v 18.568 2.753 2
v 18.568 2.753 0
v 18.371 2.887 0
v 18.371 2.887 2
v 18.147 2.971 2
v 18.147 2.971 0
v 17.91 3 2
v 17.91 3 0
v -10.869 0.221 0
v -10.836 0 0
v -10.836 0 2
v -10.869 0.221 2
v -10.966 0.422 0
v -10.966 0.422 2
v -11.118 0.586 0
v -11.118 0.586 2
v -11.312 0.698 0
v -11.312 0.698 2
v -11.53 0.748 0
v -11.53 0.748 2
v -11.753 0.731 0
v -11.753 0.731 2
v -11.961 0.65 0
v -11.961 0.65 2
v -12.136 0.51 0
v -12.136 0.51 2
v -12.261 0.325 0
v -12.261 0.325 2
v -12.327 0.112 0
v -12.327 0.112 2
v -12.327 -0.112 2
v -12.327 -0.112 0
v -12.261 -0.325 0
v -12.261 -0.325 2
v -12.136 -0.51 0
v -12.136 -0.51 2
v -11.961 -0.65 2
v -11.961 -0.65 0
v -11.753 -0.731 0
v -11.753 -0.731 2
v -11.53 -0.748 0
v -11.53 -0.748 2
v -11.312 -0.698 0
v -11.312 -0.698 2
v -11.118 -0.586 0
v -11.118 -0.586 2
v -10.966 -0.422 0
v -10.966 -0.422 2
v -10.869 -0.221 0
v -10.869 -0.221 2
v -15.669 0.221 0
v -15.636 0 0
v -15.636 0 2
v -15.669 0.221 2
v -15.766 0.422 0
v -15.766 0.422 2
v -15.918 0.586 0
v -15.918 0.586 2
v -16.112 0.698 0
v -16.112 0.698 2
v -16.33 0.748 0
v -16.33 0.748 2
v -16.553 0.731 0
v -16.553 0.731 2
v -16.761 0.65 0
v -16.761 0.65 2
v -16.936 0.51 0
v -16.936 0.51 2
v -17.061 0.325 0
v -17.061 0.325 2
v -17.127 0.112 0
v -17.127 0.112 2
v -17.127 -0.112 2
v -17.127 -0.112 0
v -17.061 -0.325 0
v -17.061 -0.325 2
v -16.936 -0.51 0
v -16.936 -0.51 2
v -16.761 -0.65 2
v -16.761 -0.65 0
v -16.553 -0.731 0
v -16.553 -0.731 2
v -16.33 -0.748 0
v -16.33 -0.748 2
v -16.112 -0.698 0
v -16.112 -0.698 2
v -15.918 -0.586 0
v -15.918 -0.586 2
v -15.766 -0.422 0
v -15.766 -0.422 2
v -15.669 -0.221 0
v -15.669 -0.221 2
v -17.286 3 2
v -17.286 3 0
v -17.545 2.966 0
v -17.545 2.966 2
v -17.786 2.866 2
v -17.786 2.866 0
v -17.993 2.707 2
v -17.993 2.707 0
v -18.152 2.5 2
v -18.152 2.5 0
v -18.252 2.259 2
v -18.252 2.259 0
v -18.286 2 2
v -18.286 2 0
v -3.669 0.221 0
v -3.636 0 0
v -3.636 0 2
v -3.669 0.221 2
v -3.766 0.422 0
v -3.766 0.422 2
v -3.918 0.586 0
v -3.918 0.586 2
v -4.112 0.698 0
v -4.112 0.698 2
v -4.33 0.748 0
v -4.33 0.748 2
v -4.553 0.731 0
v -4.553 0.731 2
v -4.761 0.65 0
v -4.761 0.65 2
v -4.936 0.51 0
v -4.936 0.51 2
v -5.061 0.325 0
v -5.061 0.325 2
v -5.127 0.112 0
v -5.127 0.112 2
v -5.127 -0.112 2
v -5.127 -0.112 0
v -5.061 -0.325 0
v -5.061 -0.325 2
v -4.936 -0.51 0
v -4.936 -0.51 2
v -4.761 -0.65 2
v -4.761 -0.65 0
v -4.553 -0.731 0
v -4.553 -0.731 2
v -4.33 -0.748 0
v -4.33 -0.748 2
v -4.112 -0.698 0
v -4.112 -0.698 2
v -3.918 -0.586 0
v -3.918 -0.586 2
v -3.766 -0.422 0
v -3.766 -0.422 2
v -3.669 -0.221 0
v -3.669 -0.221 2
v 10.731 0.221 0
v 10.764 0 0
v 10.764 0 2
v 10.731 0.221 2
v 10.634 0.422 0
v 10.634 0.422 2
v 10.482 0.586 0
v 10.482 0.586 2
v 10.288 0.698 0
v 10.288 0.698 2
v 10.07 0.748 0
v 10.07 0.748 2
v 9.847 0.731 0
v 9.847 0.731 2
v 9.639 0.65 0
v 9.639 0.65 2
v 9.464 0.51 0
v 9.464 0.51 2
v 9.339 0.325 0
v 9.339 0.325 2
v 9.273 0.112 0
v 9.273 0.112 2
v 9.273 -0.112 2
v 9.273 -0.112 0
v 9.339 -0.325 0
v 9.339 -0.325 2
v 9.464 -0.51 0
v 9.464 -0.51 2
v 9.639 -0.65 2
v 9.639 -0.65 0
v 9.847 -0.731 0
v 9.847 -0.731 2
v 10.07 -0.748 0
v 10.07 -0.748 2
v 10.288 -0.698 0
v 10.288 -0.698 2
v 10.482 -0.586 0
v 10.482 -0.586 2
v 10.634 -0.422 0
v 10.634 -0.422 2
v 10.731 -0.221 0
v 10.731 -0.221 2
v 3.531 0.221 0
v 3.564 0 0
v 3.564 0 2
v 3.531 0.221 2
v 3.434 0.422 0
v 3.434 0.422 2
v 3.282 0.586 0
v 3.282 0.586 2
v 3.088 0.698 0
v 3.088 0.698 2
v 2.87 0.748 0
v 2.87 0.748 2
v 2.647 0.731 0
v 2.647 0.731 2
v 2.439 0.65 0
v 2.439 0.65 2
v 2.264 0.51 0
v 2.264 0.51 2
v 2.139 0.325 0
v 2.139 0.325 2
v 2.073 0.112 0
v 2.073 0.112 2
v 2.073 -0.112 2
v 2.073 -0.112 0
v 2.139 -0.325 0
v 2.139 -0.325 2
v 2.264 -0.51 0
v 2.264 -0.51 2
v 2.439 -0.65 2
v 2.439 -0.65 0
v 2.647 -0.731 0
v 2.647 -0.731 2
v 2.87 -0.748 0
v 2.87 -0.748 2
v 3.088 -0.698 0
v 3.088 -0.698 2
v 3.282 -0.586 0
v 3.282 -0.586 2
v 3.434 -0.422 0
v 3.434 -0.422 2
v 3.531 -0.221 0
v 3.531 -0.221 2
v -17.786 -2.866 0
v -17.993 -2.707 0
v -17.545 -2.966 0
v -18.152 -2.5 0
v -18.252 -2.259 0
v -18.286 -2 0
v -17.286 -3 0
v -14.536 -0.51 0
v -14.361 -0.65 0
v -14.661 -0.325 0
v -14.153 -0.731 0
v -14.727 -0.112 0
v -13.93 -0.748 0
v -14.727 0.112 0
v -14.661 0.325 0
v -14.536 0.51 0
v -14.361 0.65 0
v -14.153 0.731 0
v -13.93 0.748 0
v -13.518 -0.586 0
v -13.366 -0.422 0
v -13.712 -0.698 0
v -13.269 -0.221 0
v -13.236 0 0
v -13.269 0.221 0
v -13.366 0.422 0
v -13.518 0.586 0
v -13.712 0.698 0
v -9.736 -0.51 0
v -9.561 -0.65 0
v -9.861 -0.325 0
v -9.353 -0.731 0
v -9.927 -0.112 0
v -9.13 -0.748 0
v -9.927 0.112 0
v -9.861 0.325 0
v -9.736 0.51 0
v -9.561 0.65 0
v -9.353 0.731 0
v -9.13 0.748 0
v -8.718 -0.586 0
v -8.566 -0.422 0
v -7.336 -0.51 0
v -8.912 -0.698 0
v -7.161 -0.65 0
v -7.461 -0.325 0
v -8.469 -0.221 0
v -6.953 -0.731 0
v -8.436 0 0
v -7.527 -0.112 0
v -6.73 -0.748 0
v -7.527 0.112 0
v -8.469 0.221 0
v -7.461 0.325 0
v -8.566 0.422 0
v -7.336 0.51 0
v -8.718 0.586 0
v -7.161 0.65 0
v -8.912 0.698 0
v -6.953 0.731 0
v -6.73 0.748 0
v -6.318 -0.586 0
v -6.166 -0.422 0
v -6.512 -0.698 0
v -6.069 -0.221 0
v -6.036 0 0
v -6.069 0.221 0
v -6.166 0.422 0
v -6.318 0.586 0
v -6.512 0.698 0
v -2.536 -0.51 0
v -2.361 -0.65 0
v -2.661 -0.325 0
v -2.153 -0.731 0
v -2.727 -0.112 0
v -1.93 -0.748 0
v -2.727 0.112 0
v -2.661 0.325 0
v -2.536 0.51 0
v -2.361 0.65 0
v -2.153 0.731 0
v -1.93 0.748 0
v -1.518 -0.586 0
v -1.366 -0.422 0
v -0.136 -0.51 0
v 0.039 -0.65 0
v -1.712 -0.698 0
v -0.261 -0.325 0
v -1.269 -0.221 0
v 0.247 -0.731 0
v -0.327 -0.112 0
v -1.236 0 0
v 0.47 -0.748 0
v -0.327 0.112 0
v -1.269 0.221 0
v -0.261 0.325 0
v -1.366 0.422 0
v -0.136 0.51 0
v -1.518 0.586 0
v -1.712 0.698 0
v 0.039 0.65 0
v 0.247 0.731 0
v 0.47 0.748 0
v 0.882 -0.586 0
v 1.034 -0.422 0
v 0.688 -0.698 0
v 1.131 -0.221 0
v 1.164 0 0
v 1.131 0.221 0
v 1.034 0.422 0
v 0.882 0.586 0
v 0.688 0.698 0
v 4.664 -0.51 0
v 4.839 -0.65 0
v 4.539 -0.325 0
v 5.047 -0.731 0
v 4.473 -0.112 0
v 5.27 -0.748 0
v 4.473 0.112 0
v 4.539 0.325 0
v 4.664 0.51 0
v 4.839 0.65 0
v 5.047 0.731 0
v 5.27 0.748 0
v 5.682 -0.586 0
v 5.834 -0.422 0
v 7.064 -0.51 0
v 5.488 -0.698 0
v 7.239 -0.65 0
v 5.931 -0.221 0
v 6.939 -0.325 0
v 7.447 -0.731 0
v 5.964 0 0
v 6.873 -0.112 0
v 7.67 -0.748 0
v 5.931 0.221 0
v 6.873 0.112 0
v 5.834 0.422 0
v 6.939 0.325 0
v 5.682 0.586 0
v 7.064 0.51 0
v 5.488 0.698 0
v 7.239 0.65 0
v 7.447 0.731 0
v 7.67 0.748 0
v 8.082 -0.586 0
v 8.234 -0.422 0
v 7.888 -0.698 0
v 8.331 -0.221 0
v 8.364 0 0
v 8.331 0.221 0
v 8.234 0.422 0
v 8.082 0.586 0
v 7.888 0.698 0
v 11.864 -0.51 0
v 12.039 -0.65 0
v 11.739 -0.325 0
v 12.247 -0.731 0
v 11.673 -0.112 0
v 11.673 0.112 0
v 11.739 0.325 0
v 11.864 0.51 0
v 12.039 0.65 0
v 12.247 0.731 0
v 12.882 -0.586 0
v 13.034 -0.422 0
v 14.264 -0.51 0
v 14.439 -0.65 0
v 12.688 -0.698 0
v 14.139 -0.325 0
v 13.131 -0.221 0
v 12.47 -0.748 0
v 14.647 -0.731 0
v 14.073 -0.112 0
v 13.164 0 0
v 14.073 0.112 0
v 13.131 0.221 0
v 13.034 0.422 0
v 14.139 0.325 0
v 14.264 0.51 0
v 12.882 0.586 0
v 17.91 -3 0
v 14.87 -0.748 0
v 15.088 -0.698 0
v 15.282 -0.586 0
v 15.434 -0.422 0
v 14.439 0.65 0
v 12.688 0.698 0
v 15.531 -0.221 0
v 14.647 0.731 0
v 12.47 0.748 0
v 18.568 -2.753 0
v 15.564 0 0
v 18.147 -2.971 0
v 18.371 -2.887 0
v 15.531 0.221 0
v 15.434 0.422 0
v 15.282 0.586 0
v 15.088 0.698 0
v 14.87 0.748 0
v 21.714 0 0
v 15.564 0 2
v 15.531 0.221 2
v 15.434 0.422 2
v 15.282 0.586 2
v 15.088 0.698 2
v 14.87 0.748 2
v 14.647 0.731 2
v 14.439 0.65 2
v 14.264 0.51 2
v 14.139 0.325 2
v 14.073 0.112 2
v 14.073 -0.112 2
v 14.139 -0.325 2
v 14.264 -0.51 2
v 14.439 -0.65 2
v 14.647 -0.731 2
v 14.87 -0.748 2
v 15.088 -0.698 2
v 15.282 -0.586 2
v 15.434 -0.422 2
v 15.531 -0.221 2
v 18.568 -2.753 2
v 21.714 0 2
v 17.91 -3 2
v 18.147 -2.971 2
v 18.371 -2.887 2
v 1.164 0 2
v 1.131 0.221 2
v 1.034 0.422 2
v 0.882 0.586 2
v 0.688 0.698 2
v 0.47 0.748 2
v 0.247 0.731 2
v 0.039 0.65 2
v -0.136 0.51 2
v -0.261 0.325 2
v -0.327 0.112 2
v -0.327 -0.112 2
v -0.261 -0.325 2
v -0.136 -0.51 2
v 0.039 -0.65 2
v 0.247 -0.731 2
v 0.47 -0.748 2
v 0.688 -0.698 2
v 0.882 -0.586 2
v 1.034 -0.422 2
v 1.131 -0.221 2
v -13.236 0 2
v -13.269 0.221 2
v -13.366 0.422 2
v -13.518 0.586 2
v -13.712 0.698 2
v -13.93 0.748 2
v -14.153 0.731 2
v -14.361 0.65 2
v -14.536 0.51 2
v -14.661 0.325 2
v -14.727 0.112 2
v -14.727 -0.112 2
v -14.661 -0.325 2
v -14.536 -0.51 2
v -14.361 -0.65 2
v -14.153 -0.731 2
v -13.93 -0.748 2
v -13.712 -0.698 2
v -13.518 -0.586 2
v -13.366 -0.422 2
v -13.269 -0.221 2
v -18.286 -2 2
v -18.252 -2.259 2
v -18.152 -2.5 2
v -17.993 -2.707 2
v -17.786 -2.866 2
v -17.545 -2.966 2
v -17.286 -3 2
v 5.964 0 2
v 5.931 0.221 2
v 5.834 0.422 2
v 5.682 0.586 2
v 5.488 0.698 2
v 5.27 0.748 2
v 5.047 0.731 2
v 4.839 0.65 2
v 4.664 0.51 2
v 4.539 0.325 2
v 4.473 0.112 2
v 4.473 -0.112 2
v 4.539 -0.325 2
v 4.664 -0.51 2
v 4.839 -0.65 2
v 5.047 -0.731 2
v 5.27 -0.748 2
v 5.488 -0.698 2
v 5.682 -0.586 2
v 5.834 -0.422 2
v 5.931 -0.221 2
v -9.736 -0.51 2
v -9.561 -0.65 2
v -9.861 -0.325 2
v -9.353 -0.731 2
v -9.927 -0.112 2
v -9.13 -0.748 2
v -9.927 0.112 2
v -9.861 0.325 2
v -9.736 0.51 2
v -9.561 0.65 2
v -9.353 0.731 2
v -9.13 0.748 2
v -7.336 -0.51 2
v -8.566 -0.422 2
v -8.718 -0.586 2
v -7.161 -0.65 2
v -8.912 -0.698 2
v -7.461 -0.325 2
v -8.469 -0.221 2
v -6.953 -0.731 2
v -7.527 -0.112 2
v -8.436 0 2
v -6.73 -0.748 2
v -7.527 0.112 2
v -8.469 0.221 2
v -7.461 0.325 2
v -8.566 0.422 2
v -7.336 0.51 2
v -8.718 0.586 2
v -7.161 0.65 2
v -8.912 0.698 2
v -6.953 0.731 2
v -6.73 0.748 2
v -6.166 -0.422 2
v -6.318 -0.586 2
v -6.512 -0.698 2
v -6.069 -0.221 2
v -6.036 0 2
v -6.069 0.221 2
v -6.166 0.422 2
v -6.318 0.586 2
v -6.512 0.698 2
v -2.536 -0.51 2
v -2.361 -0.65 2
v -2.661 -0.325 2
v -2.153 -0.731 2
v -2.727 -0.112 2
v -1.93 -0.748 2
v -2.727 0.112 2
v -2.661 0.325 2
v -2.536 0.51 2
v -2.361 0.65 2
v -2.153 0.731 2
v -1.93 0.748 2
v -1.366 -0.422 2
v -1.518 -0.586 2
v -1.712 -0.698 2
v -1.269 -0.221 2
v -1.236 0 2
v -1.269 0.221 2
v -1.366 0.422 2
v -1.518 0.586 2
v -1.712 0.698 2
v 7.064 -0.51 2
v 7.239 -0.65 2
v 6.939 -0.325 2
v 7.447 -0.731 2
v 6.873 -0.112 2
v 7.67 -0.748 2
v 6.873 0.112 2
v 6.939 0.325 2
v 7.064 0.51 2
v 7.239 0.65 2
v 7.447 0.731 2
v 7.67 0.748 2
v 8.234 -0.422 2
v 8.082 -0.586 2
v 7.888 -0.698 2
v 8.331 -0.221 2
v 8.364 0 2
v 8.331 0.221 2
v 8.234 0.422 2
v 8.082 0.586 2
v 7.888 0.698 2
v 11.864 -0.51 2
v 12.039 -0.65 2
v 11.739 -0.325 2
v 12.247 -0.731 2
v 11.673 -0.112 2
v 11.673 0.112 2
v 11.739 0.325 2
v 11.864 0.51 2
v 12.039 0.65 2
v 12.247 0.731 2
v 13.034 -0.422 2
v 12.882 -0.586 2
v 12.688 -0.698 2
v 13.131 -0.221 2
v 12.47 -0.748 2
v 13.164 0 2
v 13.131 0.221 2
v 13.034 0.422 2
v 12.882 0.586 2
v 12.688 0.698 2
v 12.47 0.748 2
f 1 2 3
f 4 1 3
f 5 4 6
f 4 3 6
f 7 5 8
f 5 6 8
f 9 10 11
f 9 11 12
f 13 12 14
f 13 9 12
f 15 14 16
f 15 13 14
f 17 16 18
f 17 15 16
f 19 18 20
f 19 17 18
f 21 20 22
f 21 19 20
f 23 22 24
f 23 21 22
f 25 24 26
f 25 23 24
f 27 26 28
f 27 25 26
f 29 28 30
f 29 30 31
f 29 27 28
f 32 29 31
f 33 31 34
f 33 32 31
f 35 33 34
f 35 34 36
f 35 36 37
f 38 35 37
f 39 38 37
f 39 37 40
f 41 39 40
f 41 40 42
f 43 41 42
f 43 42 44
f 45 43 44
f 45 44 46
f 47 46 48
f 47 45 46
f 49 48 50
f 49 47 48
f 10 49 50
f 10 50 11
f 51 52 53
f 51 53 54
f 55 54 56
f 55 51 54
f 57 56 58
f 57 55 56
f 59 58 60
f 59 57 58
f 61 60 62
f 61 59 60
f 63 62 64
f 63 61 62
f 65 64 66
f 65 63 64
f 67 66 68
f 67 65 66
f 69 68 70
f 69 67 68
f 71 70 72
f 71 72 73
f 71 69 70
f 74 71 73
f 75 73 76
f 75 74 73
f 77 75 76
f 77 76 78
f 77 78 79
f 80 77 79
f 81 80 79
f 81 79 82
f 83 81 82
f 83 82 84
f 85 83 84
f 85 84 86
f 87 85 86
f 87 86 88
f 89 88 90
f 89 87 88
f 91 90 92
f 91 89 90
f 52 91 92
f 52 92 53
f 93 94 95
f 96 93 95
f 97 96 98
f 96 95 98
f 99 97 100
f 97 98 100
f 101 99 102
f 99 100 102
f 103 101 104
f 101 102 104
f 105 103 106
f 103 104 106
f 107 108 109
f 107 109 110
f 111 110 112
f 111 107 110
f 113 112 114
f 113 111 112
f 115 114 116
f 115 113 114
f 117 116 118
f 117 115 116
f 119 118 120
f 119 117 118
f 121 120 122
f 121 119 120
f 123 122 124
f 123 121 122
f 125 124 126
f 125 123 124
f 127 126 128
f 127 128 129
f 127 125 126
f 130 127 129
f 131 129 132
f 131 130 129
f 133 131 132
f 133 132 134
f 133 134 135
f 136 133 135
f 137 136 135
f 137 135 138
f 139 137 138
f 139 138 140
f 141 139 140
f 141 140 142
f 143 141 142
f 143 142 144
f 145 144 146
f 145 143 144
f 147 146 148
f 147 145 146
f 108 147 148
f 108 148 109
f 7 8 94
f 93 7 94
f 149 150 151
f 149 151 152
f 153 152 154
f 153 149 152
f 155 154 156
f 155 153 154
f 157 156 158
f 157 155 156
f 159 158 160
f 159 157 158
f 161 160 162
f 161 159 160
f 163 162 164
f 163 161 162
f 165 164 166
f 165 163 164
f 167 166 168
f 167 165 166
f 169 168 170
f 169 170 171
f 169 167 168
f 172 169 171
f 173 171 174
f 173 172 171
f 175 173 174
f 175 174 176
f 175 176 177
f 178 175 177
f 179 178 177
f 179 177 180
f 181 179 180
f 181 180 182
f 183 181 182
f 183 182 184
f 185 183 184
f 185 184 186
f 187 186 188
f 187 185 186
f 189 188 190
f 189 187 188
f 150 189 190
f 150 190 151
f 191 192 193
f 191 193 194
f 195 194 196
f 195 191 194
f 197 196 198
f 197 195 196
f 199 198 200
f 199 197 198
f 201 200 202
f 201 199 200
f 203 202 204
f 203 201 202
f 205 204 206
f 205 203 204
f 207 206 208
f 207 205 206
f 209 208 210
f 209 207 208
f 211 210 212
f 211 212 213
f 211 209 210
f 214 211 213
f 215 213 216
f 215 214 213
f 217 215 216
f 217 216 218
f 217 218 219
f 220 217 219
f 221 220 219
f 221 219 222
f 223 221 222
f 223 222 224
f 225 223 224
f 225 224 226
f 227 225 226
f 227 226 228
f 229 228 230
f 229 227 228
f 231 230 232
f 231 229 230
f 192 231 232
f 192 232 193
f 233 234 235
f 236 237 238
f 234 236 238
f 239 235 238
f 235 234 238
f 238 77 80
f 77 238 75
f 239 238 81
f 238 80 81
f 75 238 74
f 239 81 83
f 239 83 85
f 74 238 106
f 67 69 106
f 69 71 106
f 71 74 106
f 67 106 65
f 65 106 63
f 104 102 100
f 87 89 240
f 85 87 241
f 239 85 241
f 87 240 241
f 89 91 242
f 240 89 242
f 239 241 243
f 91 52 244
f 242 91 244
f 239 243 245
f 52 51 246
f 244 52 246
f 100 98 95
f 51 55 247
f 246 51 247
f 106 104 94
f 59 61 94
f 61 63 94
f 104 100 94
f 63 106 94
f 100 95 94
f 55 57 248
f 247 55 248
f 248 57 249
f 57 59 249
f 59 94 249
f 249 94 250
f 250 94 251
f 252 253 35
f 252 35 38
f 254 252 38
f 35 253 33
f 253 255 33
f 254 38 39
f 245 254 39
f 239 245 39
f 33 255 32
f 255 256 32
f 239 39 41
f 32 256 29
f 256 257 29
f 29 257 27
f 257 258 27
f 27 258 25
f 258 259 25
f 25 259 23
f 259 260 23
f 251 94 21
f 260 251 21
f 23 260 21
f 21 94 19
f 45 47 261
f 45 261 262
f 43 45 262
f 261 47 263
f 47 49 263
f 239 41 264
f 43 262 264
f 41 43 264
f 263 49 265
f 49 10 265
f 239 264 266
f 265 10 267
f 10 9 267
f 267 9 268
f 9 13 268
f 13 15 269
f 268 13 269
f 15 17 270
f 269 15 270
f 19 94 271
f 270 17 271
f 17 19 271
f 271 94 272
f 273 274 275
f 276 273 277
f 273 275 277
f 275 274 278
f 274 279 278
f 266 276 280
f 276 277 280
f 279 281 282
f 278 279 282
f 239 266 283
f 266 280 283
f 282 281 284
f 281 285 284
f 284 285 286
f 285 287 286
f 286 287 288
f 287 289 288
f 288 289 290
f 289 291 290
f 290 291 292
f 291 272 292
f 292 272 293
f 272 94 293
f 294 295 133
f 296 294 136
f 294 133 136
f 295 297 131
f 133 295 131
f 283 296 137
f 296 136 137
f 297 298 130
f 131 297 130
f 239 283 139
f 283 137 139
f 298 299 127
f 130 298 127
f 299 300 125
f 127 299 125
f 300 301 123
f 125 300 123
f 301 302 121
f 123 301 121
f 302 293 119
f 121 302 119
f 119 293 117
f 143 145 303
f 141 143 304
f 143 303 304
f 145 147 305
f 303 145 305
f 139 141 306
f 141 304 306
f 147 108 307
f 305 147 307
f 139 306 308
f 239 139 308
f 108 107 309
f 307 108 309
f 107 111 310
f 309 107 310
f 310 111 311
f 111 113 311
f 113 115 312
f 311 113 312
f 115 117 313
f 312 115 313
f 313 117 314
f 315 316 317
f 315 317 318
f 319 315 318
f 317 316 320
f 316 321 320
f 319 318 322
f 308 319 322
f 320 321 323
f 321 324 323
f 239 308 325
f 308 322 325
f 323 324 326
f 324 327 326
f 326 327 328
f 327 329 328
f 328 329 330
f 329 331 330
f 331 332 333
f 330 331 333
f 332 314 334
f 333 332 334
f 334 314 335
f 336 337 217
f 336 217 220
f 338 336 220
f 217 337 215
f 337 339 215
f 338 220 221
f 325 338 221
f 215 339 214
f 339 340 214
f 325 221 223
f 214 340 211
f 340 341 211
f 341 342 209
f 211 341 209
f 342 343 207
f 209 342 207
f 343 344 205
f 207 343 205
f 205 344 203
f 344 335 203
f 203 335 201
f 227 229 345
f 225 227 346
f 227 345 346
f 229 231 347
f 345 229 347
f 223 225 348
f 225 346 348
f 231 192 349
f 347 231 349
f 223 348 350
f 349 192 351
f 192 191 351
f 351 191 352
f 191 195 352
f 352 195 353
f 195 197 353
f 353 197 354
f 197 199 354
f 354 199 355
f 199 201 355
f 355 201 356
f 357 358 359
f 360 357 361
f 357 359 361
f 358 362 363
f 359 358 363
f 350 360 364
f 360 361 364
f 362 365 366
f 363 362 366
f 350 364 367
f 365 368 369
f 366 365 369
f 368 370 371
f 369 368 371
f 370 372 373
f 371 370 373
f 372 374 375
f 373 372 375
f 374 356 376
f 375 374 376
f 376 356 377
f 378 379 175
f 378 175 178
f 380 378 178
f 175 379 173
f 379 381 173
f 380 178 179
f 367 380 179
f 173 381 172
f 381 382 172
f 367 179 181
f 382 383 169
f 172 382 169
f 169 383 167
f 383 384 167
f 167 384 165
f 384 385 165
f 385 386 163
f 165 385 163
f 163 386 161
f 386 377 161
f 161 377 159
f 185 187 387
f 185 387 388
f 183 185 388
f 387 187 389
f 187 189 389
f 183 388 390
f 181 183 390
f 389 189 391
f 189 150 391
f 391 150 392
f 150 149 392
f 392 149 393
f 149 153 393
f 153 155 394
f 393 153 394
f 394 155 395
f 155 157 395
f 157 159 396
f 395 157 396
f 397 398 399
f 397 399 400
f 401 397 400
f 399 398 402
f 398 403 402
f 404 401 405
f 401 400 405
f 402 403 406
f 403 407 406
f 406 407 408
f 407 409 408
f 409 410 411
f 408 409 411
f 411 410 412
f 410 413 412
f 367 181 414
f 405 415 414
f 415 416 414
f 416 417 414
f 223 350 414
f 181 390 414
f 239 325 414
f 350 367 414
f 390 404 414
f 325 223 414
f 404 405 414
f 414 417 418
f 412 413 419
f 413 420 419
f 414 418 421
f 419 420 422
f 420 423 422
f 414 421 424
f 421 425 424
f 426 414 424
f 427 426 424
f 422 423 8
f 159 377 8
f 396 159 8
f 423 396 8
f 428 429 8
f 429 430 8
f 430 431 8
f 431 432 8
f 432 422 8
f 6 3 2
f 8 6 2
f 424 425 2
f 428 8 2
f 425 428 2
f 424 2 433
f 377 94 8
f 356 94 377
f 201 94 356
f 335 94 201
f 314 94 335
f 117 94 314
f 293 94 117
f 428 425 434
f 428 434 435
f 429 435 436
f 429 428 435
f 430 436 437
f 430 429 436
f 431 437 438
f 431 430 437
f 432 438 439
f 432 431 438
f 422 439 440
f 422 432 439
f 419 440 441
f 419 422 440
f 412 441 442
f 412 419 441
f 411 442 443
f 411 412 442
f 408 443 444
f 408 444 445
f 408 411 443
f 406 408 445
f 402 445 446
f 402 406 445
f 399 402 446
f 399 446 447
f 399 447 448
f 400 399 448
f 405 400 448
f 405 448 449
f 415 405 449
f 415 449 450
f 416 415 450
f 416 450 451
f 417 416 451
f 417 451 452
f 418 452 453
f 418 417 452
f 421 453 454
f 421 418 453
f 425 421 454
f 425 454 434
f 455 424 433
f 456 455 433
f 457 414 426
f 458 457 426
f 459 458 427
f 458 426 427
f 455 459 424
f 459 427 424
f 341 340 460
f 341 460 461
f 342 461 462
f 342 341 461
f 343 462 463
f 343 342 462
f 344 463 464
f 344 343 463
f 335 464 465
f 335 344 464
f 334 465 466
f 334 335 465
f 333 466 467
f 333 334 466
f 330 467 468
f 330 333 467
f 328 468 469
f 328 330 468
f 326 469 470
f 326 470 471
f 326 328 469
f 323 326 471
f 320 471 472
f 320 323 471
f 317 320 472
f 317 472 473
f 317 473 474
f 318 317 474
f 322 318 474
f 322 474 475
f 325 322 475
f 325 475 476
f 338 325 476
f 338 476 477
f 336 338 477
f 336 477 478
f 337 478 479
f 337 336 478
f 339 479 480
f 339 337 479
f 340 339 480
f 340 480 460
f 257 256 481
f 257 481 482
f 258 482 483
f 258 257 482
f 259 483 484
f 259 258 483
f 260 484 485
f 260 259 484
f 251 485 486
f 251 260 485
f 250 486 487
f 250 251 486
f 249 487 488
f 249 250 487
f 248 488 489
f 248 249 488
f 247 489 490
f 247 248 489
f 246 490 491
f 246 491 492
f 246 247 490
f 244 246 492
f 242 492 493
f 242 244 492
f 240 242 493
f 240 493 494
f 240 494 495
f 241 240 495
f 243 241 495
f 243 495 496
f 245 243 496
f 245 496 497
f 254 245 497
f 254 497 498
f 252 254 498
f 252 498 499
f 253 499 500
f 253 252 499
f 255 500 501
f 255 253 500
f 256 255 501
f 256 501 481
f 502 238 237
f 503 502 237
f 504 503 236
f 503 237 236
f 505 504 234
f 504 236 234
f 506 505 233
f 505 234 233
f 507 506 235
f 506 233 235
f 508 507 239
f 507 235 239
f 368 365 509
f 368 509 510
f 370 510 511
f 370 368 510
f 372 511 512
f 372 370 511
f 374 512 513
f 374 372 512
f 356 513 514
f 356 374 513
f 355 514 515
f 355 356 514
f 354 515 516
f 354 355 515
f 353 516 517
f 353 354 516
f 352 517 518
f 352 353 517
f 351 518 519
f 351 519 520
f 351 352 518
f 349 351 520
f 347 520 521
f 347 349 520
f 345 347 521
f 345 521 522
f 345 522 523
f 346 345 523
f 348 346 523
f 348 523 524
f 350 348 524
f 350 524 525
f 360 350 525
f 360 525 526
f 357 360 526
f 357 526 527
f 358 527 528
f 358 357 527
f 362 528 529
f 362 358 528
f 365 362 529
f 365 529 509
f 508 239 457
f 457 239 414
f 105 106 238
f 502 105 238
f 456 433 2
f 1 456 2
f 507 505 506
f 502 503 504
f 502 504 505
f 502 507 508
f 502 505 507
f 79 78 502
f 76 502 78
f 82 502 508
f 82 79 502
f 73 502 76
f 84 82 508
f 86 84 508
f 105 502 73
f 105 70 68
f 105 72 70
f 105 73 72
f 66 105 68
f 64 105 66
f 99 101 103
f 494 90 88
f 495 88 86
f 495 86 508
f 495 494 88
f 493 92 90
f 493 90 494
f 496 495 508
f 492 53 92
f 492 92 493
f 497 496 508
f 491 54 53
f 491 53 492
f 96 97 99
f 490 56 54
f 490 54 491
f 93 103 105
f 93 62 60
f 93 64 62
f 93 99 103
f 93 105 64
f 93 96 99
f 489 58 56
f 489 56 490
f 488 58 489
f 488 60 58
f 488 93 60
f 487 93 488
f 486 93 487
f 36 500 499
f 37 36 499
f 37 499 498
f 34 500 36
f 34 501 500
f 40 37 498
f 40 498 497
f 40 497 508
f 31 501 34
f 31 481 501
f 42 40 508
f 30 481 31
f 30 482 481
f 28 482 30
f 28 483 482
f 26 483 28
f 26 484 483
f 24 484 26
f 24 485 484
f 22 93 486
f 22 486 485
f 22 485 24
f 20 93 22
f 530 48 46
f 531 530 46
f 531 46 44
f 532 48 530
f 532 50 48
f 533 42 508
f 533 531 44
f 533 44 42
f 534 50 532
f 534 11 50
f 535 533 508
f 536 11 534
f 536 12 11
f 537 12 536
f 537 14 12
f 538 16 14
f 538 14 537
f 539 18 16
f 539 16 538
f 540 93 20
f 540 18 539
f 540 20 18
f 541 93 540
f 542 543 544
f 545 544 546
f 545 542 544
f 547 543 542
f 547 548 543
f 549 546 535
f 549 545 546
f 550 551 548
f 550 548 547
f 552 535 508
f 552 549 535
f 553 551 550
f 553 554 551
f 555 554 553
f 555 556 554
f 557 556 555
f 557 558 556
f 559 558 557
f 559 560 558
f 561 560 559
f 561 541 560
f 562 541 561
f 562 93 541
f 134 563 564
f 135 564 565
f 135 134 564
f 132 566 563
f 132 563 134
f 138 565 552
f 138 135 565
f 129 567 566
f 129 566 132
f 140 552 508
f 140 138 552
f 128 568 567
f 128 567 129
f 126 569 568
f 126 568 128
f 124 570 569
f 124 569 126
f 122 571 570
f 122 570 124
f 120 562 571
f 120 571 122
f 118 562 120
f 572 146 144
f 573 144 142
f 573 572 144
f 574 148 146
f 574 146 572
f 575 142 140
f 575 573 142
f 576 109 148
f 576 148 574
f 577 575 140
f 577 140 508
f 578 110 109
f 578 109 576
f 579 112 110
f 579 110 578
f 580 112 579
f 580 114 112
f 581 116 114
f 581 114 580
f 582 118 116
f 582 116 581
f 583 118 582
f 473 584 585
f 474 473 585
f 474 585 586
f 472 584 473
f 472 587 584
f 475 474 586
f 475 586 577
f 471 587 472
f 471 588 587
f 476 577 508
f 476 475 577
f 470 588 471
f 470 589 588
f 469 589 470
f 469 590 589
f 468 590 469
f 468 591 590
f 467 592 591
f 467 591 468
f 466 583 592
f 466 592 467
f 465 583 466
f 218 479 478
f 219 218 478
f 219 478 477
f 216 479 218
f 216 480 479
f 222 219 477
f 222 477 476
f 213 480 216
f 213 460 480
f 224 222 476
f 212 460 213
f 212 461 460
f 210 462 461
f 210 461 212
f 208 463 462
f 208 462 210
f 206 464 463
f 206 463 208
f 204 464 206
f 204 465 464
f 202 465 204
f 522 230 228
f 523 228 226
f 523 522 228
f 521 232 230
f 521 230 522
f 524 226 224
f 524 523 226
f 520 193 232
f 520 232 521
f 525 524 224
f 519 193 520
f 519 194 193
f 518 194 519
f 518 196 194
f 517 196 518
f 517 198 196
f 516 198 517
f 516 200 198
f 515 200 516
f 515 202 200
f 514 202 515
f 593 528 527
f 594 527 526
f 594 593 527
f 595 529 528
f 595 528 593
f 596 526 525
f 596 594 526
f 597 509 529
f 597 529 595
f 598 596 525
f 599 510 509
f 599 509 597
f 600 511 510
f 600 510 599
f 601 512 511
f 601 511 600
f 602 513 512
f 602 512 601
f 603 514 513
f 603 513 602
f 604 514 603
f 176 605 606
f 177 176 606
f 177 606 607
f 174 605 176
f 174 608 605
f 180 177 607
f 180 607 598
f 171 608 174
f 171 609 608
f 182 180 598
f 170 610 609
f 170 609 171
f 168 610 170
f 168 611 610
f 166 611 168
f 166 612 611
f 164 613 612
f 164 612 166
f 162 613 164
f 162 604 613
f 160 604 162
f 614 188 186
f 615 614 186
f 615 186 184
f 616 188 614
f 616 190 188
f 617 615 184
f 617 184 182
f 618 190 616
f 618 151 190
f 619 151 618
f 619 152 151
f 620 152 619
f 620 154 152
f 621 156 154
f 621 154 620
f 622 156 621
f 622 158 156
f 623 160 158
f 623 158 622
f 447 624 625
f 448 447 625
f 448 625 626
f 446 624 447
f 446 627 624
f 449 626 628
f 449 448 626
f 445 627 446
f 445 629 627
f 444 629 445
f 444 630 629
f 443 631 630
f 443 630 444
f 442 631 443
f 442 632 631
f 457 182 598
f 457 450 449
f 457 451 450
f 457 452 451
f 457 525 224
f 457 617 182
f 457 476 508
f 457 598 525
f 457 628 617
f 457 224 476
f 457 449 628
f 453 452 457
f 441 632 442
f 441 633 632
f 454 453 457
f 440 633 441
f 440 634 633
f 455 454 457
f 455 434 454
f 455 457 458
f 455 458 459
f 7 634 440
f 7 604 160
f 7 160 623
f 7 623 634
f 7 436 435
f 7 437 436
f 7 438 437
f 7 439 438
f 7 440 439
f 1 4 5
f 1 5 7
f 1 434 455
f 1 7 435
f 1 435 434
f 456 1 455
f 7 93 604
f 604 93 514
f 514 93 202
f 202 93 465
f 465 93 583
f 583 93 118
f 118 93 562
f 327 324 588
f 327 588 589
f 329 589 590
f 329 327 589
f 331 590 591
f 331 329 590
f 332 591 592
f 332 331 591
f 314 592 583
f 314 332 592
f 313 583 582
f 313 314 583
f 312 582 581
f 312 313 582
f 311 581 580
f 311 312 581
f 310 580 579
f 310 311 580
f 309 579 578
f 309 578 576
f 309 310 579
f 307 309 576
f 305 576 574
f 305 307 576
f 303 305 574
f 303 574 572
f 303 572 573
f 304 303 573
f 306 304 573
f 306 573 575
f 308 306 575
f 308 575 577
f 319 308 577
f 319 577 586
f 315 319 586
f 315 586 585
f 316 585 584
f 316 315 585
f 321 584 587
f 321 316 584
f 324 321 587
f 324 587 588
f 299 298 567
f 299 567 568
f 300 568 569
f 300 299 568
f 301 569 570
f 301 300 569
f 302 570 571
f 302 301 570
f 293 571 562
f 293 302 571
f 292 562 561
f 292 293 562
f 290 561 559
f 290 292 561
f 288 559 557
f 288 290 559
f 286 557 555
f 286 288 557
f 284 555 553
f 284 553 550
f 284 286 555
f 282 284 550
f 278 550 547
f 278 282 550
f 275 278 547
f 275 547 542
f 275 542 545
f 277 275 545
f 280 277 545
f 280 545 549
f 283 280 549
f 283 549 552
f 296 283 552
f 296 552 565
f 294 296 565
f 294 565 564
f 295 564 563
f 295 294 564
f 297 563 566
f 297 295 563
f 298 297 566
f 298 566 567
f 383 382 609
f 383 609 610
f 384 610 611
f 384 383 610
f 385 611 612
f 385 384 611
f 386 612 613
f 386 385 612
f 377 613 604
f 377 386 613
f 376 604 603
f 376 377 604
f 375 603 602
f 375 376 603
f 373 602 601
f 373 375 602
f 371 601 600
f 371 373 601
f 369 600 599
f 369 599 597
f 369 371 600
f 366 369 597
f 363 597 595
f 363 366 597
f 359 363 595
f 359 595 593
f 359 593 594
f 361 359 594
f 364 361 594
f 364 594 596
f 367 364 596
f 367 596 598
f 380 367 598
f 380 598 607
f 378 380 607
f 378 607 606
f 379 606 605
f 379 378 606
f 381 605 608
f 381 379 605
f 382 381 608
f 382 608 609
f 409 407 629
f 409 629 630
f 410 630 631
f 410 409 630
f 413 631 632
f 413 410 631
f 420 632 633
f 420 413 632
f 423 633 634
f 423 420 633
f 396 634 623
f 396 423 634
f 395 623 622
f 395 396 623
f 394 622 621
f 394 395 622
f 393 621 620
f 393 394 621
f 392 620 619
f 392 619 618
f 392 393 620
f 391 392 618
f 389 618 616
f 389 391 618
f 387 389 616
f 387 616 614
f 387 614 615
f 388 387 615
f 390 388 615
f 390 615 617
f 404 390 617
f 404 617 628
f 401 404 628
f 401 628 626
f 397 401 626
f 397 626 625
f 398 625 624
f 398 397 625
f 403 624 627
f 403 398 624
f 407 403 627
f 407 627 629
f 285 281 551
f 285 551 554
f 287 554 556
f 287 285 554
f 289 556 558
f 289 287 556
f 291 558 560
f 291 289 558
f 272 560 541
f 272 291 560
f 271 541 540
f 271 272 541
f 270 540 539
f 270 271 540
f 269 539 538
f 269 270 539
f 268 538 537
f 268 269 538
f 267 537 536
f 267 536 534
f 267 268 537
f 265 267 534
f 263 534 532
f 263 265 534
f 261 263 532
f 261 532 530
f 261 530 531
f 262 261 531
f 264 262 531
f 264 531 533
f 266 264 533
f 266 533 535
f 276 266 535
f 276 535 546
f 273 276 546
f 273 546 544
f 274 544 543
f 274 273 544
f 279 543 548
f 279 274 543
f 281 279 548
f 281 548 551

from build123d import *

# Parameters (mm, degrees)
CROQUIS2_R              = 0.75
SALIENTE_EXTRUIR1_DEPTH = 2


with BuildPart() as part:
    # Croquis2 → Saliente-Extruir1 (new body)
    with BuildSketch(Plane.XY):
        with BuildLine():
            Line((18.568483774, -2.752576707), (21.714285714, -1.14e-07))
            Line((21.714285714, -1.14e-07), (18.568483781, 2.752576682))
            ThreePointArc((18.568483781, 2.752576682), (18.261705841, 2.936102741), (17.909979159, 3))
            Line((17.909979159, 3), (-17.285714286, 3))
            ThreePointArc((-17.285714286, 3), (-17.992821067, 2.707106781), (-18.285714286, 2))
            Line((-18.285714286, 2), (-18.285714286, -2))
            ThreePointArc((-18.285714286, -2), (-17.992821067, -2.707106781), (-17.285714286, -3))
            Line((-17.285714286, -3), (17.90997918, -3))
            ThreePointArc((17.90997918, -3), (18.261705845, -2.936102747), (18.568483774, -2.752576707))
        make_face()
        with Locations((-16.385714286, 0)):
            Circle(CROQUIS2_R, mode=Mode.SUBTRACT)
        with Locations((-13.985714286, 0)):
            Circle(CROQUIS2_R, mode=Mode.SUBTRACT)
        with Locations((-11.585714286, 0)):
            Circle(CROQUIS2_R, mode=Mode.SUBTRACT)
        with Locations((-9.185714286, 0)):
            Circle(CROQUIS2_R, mode=Mode.SUBTRACT)
        with Locations((-6.785714286, 0)):
            Circle(CROQUIS2_R, mode=Mode.SUBTRACT)
        with Locations((-4.385714286, 0)):
            Circle(CROQUIS2_R, mode=Mode.SUBTRACT)
        with Locations((-1.985714286, 0)):
            Circle(CROQUIS2_R, mode=Mode.SUBTRACT)
        with Locations((0.414285714, 0)):
            Circle(CROQUIS2_R, mode=Mode.SUBTRACT)
        with Locations((2.814285714, 0)):
            Circle(CROQUIS2_R, mode=Mode.SUBTRACT)
        with Locations((5.214285714, 0)):
            Circle(CROQUIS2_R, mode=Mode.SUBTRACT)
        with Locations((7.614285714, 0)):
            Circle(CROQUIS2_R, mode=Mode.SUBTRACT)
        with Locations((10.014285714, 0)):
            Circle(CROQUIS2_R, mode=Mode.SUBTRACT)
        with Locations((12.414285714, 0)):
            Circle(CROQUIS2_R, mode=Mode.SUBTRACT)
        with Locations((14.814285714, 0)):
            Circle(CROQUIS2_R, mode=Mode.SUBTRACT)
    extrude(amount=SALIENTE_EXTRUIR1_DEPTH)


solid = part.part
